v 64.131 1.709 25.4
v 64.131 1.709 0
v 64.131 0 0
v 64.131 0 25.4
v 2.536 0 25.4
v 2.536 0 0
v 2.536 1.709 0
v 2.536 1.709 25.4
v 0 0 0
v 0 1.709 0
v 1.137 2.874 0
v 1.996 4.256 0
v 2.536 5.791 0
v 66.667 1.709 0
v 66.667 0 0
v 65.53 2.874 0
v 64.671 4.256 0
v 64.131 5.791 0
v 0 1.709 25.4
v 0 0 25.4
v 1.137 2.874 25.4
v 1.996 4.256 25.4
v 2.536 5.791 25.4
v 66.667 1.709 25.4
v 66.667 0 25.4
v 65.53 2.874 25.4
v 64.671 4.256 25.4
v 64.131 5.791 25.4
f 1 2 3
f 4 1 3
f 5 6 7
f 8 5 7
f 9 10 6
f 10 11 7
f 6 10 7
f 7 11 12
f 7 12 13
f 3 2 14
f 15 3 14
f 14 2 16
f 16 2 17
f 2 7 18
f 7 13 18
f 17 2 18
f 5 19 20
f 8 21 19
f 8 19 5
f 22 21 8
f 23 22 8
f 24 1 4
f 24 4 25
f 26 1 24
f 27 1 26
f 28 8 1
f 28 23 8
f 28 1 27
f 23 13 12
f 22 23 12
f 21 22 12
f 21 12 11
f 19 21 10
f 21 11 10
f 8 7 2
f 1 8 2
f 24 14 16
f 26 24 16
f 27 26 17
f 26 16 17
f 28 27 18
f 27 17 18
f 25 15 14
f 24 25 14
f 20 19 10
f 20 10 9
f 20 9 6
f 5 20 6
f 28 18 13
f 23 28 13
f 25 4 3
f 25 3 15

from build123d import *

# Parameters (mm, degrees)
F1_DEPTH = 25.4


with BuildPart() as f1:
    # F0 (on Top) → F1 (new body)
    with BuildSketch(Plane.XY):
        with BuildLine():
            Line((0, 1.709418), (0, 0))
            Line((0, 0), (2.536132, 0))
            Line((2.536132, 0), (2.536132, 1.70942))
            Line((2.536132, 1.70942), (64.130943, 1.70942))
            Line((64.130943, 1.70942), (64.130943, 0))
            Line((64.130943, 0), (66.667075, 0))
            Line((66.667075, 0), (66.667075, 1.709418))
            ThreePointArc((66.667075, 1.709418), (65.063333, 3.541403), (64.130943, 5.790582))
            Line((64.130943, 5.790582), (2.536132, 5.790582))
            ThreePointArc((2.536132, 5.790582), (1.603742, 3.541403), (0, 1.709418))
        make_face()
    extrude(amount=F1_DEPTH)


solid = f1.part
